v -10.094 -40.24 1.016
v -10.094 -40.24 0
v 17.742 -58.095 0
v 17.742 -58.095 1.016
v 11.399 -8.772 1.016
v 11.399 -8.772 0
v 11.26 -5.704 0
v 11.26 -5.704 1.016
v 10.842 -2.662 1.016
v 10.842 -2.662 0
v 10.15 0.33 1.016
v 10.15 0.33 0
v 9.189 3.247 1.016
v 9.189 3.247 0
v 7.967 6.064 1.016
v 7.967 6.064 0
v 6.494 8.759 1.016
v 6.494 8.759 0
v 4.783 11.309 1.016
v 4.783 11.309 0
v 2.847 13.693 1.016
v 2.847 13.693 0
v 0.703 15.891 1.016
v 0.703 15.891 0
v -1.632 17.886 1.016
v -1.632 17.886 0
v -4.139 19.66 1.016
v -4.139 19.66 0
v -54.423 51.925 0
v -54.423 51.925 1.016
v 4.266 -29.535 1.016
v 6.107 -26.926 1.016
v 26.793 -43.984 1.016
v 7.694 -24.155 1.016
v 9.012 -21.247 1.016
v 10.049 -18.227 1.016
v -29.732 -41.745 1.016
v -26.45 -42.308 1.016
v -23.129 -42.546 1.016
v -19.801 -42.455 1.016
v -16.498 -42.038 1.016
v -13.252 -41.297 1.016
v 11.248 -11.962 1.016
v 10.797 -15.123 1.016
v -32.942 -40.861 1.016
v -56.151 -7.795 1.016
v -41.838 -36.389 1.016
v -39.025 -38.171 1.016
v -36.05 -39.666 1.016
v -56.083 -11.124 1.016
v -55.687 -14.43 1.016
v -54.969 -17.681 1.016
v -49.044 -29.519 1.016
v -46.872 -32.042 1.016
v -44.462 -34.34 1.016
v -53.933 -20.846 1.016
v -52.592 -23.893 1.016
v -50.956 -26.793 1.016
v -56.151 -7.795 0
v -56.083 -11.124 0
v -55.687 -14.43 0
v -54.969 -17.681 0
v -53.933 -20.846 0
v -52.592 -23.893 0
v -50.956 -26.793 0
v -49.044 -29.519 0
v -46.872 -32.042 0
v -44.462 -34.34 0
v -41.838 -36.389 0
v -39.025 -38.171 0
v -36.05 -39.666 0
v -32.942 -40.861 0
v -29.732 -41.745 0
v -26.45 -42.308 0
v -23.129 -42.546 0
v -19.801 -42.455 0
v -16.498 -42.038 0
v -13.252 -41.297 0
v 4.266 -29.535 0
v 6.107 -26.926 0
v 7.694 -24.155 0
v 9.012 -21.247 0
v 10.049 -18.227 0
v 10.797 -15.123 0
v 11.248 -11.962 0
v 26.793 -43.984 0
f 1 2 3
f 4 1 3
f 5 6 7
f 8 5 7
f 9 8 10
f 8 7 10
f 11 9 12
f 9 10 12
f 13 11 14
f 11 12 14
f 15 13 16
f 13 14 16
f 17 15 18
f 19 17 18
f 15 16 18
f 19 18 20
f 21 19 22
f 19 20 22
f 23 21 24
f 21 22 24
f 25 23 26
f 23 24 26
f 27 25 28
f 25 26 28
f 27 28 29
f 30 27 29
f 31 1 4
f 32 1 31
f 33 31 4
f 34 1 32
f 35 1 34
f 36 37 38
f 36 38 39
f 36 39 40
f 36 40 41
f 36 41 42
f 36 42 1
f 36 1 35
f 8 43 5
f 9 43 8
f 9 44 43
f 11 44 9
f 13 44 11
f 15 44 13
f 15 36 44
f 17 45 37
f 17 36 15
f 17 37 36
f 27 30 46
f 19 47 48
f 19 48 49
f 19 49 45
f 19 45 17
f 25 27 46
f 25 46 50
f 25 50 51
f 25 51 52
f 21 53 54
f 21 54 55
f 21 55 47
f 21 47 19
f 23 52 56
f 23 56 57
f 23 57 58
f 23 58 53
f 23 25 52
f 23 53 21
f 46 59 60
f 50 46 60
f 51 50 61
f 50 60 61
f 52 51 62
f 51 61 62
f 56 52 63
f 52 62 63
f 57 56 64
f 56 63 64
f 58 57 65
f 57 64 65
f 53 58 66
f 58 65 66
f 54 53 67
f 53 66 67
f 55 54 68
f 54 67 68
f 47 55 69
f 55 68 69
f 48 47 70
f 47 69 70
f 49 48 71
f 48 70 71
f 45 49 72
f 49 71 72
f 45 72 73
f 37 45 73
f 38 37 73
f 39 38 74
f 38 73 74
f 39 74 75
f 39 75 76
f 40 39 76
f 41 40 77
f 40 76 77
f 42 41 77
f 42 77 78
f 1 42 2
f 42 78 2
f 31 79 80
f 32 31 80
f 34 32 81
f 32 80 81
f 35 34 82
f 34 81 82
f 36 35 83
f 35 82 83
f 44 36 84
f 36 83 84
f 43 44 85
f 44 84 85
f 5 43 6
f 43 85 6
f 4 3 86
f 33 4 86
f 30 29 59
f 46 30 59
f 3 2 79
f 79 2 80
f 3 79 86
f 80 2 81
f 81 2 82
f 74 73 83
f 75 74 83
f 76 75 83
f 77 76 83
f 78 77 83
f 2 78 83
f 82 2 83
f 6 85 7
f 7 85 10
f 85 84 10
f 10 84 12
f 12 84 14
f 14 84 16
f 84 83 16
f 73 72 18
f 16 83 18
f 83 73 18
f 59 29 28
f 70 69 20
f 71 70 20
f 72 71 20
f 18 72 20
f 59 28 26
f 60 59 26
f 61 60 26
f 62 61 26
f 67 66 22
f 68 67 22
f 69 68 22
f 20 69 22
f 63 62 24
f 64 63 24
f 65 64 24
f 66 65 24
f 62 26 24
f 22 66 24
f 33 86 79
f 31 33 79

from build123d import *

# Parameters (mm, degrees)
F1_DEPTH = 1.016


with BuildPart() as f1:
    # F0 (on Top) → F1 (new body)
    with BuildSketch(Plane.XY):
        with BuildLine():
            Line((-4.139, 19.660113), (-54.422749, 51.924916))
            Line((-54.422749, 51.924916), (-56.150547, -7.795161))
            ThreePointArc((-56.150547, -7.795161), (-41.837863, -36.389492), (-10.094143, -40.23981))
            Line((-10.094143, -40.23981), (17.741758, -58.094875))
            Line((17.741758, -58.094875), (26.792866, -43.98427))
            Line((26.792866, -43.98427), (4.265871, -29.534551))
            ThreePointArc((4.265871, -29.534551), (9.566227, -19.748967), (11.399325, -8.77212))
            ThreePointArc((11.399325, -8.77212), (7.261307, 7.428431), (-4.139, 19.660113))
        make_face()
    extrude(amount=F1_DEPTH)


solid = f1.part
